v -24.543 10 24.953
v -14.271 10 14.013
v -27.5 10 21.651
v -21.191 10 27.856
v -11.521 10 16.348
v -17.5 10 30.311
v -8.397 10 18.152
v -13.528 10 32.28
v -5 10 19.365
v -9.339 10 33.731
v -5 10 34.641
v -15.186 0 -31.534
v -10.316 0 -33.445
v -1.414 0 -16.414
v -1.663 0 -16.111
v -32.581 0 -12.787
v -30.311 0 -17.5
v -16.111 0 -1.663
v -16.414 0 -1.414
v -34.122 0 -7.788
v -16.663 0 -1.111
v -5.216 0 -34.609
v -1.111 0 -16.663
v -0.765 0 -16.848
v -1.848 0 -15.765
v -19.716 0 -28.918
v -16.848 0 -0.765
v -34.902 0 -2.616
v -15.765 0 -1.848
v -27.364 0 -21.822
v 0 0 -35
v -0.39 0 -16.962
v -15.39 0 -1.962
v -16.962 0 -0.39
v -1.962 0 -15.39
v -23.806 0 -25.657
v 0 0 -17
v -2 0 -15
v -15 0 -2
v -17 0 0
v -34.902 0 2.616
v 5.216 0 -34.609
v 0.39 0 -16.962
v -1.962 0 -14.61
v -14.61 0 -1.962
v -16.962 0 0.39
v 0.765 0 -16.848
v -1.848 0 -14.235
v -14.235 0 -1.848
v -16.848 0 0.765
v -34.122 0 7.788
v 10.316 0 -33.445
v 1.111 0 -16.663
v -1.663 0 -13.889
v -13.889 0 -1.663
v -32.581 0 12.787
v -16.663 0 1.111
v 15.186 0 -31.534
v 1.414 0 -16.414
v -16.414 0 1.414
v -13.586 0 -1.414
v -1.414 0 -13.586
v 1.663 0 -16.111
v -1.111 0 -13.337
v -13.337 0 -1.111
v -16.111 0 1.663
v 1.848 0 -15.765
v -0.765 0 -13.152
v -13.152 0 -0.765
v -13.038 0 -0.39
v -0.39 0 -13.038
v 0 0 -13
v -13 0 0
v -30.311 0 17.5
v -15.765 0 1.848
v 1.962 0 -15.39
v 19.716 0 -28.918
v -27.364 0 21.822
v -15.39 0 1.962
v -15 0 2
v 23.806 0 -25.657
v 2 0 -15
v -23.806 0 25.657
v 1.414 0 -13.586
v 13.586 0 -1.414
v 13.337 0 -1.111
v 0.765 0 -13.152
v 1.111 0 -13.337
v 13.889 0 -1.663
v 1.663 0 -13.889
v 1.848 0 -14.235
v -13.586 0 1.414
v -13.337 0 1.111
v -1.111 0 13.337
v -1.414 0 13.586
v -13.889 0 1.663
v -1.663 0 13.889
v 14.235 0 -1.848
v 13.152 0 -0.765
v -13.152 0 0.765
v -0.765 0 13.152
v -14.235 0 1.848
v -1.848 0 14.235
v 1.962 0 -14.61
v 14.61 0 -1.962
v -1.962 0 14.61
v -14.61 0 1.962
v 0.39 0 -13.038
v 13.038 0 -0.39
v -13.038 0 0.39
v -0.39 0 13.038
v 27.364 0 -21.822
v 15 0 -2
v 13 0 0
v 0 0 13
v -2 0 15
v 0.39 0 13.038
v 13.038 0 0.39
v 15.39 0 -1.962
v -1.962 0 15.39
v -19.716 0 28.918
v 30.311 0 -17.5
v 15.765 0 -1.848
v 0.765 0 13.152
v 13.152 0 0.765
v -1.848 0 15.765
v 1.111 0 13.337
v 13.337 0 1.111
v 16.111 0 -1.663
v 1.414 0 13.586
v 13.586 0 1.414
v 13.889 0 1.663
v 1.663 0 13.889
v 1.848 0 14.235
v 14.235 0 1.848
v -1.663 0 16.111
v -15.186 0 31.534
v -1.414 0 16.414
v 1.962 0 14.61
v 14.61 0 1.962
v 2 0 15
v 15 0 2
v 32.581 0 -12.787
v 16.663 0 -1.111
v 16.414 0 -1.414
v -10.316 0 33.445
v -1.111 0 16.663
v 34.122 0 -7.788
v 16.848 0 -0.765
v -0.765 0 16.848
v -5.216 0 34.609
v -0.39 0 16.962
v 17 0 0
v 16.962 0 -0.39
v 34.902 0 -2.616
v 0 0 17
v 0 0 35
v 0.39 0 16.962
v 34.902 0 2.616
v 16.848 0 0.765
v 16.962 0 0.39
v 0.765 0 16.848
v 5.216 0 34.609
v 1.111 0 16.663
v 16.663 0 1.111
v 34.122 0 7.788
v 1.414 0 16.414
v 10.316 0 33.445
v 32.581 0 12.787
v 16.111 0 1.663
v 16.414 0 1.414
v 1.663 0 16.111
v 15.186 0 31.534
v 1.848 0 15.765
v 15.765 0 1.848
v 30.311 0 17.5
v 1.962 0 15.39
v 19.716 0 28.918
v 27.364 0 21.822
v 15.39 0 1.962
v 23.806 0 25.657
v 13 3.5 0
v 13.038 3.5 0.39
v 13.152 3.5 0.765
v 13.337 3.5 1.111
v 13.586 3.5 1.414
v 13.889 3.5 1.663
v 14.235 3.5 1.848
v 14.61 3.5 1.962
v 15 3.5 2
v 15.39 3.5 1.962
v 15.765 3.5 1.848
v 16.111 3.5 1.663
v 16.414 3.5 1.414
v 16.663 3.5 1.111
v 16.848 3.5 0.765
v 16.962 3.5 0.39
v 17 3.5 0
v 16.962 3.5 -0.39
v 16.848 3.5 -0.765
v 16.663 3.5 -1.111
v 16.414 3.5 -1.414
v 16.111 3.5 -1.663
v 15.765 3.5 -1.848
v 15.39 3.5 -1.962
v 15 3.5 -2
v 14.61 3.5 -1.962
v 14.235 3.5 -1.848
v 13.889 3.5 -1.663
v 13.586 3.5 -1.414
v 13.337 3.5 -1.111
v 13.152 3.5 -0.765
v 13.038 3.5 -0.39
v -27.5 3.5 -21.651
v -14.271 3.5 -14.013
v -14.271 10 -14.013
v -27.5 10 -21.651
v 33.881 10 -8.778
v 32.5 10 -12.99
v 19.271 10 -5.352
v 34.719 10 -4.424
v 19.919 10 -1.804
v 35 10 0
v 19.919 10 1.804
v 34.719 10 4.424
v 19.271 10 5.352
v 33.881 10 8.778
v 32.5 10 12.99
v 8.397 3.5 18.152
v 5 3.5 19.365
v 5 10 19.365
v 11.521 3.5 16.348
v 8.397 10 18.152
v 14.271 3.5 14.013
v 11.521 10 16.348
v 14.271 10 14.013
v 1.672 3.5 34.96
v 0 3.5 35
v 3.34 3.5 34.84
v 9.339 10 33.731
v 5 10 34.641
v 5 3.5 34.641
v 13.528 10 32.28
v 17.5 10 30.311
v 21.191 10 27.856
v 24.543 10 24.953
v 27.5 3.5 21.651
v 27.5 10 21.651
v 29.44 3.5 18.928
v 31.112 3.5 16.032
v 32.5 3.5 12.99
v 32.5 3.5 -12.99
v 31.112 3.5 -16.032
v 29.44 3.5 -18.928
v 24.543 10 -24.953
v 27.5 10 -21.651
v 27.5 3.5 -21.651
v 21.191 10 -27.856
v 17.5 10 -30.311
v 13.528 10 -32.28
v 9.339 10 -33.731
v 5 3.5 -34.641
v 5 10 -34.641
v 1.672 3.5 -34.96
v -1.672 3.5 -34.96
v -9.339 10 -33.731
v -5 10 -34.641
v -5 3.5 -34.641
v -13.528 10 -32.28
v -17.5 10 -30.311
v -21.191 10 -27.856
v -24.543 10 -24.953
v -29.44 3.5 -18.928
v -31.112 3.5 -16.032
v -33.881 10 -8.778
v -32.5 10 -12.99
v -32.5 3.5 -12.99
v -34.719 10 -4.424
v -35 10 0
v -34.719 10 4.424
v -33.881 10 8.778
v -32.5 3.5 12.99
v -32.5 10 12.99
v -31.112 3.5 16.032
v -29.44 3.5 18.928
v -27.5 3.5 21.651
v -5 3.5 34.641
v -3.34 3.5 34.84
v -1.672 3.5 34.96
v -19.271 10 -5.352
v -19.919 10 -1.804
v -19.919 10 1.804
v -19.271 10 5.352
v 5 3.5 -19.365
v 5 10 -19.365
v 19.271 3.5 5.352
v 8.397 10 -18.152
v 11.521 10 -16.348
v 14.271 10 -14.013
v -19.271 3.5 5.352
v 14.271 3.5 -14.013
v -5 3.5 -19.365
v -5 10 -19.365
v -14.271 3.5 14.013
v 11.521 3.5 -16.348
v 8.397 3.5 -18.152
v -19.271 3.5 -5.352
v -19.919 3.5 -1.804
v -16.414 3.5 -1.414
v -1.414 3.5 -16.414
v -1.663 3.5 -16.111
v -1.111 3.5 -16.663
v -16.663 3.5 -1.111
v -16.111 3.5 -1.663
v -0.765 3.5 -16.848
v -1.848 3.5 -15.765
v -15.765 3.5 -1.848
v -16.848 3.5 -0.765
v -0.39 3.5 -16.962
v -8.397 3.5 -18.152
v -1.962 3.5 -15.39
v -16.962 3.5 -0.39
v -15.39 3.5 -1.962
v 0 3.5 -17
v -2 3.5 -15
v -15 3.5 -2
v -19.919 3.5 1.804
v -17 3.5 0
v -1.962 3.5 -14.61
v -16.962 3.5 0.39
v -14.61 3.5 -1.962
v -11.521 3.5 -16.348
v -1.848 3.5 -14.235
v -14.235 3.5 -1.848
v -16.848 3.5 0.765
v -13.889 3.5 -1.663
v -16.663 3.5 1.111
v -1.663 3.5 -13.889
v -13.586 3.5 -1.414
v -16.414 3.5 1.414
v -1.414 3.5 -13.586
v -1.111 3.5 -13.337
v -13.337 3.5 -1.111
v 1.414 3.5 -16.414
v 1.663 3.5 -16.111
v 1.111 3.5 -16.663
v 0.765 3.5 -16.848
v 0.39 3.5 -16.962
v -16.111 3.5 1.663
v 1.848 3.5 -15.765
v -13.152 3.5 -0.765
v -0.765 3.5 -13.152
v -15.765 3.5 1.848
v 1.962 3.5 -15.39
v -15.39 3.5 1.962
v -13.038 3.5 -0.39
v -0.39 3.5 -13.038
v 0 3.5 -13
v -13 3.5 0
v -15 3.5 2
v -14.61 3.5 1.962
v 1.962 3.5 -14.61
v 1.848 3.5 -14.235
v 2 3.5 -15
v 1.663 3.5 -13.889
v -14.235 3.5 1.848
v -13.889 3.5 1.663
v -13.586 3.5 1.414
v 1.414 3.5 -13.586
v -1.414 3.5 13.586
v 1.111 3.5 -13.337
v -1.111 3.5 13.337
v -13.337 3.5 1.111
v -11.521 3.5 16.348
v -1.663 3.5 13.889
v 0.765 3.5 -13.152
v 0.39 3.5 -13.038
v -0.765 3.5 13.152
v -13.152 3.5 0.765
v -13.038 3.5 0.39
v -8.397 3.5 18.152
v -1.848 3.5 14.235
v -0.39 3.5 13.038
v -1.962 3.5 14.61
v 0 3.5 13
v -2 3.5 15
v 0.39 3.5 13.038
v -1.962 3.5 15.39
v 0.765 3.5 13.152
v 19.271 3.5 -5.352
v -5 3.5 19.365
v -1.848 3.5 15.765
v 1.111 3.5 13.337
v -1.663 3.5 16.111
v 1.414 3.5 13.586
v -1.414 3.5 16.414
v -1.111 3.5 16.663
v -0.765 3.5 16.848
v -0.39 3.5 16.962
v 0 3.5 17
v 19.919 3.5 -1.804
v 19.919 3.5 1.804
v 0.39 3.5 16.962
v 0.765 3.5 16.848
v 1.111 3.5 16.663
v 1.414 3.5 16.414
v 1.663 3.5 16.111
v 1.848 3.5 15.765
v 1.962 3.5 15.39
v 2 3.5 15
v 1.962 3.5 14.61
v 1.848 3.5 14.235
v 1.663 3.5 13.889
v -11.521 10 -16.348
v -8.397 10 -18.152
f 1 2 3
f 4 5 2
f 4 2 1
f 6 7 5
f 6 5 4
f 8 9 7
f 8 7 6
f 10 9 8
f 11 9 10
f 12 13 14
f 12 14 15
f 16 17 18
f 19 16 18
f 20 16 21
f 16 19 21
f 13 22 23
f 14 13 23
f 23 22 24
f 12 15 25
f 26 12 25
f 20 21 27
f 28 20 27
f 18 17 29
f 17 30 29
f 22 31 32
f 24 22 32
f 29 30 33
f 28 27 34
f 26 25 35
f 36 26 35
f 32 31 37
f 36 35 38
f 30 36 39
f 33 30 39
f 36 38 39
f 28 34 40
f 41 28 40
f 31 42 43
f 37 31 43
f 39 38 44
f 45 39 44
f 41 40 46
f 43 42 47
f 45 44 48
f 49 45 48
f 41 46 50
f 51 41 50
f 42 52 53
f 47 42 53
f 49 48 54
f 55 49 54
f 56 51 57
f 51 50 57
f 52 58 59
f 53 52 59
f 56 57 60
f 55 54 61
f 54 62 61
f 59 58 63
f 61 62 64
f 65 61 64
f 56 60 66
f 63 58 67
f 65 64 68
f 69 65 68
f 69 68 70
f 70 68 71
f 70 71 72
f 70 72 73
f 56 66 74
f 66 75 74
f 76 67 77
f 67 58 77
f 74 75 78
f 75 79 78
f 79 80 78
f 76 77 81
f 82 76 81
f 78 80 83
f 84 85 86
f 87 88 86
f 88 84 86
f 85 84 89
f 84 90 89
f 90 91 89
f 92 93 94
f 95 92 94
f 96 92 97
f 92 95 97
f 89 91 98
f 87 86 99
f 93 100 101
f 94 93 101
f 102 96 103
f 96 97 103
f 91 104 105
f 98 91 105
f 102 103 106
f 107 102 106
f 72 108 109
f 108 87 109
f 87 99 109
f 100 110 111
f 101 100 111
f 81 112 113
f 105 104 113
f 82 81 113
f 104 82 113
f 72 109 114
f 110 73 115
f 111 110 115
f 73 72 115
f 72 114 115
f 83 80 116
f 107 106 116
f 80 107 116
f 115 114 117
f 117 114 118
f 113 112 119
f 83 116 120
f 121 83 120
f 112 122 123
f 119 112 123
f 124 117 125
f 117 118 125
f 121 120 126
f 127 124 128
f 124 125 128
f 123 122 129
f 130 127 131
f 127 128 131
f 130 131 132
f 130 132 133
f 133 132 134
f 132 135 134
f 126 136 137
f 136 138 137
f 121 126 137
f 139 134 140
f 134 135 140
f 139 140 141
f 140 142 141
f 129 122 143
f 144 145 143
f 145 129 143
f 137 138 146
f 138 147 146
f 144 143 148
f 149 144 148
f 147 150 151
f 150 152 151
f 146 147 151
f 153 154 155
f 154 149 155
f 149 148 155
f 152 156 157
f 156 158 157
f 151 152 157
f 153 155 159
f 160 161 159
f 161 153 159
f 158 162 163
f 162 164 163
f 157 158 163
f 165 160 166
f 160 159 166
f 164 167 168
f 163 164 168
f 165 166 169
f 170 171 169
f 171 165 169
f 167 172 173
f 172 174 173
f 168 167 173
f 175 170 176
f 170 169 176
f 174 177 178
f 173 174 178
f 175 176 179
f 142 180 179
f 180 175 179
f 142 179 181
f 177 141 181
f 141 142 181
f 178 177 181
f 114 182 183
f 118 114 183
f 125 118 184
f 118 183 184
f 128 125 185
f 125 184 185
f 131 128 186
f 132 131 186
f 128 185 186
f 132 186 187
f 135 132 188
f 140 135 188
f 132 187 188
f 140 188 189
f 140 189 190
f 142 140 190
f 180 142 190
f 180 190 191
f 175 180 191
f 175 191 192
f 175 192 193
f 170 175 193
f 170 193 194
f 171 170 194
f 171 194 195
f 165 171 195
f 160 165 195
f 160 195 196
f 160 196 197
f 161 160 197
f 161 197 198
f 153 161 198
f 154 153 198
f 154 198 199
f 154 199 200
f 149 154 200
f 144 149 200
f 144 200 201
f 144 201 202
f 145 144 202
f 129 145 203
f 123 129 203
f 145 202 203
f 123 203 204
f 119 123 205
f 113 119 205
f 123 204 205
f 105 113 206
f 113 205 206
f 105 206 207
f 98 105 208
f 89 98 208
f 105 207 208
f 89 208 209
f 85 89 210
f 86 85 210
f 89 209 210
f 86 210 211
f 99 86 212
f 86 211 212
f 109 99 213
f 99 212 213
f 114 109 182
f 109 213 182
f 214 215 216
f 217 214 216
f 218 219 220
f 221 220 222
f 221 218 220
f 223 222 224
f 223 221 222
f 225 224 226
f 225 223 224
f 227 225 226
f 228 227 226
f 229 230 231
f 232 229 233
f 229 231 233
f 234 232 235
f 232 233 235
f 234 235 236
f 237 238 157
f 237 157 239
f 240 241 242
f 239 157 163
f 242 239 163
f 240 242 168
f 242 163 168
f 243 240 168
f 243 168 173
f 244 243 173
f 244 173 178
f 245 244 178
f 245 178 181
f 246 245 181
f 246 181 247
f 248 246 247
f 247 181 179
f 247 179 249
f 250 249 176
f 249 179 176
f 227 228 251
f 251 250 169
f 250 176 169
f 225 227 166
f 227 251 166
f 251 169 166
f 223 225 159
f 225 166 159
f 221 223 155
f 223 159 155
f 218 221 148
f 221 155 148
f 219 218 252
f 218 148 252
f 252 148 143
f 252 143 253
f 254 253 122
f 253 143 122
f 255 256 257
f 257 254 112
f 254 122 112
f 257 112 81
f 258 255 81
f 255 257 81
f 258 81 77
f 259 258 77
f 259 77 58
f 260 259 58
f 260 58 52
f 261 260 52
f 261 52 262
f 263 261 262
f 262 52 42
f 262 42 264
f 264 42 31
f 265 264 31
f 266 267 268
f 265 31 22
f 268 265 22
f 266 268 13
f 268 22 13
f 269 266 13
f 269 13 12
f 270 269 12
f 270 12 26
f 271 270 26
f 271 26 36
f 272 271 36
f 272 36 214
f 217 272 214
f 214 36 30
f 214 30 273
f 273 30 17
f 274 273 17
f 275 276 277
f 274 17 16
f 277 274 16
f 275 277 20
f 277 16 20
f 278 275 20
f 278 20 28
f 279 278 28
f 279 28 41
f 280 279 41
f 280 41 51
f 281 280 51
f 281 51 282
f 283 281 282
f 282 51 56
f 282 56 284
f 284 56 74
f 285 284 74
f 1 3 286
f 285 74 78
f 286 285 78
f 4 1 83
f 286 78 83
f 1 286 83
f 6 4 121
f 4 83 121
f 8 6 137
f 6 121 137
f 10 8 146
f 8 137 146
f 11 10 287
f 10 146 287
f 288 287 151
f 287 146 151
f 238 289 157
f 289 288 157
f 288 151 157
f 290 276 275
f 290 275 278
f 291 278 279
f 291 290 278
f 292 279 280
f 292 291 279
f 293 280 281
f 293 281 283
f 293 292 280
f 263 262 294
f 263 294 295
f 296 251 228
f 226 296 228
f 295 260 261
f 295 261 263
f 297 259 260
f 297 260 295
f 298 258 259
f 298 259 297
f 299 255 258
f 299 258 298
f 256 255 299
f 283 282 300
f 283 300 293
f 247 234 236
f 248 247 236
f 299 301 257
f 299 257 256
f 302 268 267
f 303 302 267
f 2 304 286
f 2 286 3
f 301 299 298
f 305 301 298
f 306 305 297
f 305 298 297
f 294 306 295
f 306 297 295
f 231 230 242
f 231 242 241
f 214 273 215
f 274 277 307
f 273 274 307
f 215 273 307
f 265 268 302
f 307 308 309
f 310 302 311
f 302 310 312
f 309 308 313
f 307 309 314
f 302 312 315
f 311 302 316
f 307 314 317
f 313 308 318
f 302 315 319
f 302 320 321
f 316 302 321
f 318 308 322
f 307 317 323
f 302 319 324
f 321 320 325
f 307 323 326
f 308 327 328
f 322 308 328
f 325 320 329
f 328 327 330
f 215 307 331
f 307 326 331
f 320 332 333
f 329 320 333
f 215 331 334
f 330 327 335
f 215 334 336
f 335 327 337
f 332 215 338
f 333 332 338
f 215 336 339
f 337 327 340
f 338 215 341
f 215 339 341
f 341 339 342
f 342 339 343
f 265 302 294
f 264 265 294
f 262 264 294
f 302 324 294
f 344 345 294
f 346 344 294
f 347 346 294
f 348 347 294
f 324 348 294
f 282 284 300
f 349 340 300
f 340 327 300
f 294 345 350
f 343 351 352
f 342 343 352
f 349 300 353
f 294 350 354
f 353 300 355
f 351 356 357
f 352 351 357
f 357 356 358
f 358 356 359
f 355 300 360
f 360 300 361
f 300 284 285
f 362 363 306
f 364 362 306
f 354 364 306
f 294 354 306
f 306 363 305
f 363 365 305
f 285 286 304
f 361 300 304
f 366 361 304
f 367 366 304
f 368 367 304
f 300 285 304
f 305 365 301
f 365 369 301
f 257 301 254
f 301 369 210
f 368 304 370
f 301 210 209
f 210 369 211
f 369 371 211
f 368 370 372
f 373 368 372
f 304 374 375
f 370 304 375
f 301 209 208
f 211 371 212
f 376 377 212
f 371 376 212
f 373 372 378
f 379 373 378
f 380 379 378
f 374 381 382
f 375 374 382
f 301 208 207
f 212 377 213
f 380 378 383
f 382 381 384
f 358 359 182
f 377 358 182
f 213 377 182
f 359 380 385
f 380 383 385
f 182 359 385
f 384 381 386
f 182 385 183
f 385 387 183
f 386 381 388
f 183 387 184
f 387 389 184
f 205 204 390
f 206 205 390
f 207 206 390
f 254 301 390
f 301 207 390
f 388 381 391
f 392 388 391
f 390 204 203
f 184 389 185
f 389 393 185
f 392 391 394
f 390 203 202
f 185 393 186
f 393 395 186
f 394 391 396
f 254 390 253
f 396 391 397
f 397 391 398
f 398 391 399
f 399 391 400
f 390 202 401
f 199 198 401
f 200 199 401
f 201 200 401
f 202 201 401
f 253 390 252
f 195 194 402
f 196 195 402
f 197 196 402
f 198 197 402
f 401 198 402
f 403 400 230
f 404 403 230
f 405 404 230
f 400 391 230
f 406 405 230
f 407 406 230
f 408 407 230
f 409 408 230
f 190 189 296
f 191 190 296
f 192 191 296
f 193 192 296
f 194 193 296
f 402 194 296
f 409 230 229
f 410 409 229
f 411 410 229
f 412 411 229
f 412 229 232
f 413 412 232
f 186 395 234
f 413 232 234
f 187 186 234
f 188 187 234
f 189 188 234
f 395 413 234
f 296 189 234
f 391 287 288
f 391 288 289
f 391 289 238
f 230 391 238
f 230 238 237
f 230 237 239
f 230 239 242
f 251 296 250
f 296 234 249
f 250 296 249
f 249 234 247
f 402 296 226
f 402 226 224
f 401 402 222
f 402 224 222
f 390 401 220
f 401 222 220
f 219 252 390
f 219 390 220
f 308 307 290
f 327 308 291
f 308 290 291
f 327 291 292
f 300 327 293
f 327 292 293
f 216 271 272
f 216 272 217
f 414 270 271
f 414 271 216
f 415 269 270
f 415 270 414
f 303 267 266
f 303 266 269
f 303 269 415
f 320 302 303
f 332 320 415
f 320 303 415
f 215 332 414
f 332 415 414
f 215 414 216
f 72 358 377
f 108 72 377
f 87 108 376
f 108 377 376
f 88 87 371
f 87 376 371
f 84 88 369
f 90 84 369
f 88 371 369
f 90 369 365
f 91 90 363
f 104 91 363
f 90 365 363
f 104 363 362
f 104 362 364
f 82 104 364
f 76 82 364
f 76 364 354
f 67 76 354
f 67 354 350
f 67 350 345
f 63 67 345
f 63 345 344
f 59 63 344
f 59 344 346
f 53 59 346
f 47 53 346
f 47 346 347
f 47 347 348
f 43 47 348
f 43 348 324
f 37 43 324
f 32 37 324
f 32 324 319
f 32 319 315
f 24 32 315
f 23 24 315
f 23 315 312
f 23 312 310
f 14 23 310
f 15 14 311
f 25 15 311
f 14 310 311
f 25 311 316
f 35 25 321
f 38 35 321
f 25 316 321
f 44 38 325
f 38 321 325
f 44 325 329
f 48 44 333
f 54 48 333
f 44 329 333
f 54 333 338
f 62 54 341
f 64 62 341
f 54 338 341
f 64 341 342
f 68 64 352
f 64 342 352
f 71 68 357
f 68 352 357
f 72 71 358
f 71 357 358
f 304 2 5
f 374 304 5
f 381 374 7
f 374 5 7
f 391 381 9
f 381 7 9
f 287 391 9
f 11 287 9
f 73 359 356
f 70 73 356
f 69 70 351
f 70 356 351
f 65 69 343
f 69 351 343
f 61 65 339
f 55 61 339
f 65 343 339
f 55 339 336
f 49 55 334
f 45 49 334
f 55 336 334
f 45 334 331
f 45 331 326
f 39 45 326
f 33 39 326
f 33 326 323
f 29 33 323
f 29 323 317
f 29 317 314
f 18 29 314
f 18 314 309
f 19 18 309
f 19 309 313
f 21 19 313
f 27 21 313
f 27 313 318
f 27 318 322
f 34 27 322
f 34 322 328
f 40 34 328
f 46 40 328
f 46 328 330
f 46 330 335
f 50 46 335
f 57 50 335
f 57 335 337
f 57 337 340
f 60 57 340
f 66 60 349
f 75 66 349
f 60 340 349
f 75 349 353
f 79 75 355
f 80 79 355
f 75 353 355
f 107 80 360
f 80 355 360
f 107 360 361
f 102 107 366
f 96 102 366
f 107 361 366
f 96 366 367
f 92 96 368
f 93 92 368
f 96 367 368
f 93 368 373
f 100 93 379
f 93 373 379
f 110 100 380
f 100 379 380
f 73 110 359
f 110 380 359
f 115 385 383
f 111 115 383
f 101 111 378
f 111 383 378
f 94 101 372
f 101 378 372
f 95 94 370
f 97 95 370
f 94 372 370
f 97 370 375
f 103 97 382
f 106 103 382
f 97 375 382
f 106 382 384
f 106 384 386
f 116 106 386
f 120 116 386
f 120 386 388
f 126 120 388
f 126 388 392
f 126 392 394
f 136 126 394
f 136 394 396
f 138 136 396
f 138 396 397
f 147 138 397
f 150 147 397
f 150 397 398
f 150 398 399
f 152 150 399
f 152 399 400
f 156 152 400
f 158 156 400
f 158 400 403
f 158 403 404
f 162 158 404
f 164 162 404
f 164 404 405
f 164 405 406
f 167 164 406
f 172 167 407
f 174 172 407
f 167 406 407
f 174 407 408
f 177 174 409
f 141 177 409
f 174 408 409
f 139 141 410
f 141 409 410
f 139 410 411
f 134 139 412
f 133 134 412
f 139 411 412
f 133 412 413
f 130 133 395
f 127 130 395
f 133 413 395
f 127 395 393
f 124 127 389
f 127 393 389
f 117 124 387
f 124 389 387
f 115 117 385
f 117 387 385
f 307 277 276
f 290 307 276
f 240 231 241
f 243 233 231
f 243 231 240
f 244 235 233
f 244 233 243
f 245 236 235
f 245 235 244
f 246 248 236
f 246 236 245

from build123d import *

# Parameters (mm, degrees)
SKETCH1_R           = 35
BOSS_EXTRUDE1_DEPTH = 10
CUT_EXTRUDE1_REACH  = 52.498
SKETCH2_R           = 2
CIRPATTERN1_COUNT   = 4
SKETCH5_W           = 10
SKETCH5_H           = 16.60119737
CUT_EXTRUDE2_DEPTH  = 51.497524692
CIRPATTERN2_COUNT   = 3
SKETCH6_R           = 20
CUT_EXTRUDE3_DEPTH  = 6.5


with BuildPart() as part:
    # Sketch1 → Boss-Extrude1 (new body)
    with BuildSketch(Plane(origin=(0, 0, 0), x_dir=(1, 0, 0), z_dir=(0, 1, 0))):
        with Locations(Location((0, 0, 0), (0, 0, 270))):
            Circle(SKETCH1_R)
    extrude(amount=BOSS_EXTRUDE1_DEPTH)

    # Sketch2 → Cut-Extrude1 (cut, up to next)
    with BuildSketch(Plane(origin=(0, 10, 0), x_dir=(1, 0, 0), z_dir=(0, 1, 0)), mode=Mode.PRIVATE) as cut_extrude1_sk1:
        with Locations(Location((0, 15, 0), (0, 0, 270))):
            Circle(SKETCH2_R)
    cut_extrude1_tool1 = extrude(cut_extrude1_sk1.sketch, amount=-CUT_EXTRUDE1_REACH, mode=Mode.PRIVATE) & part.part
    cut_extrude1 = cut_extrude1_tool1.solids().sort_by_distance((0, 10, -15))[0]
    add(cut_extrude1, mode=Mode.SUBTRACT)

    # CirPattern1: Cut-Extrude1 ×4 about axis
    cirpattern1_axis = Axis((0, 0, 0), (0, 1, 0))
    for i in range(1, CIRPATTERN1_COUNT):
        add(cut_extrude1.rotate(cirpattern1_axis, i * 360 / CIRPATTERN1_COUNT), mode=Mode.SUBTRACT)

    # Sketch5 → Cut-Extrude2 (cut, symmetric)
    with BuildSketch(Plane.XY):
        with Locations((0, 11.800598685)):
            Rectangle(SKETCH5_W, SKETCH5_H)
    cut_extrude2 = extrude(amount=CUT_EXTRUDE2_DEPTH, both=True, mode=Mode.SUBTRACT)

    # CirPattern2: Cut-Extrude2 ×3 about axis
    cirpattern2_axis = Axis((0, 0, 0), (0, 1, 0))
    for i in range(1, CIRPATTERN2_COUNT):
        add(cut_extrude2.rotate(cirpattern2_axis, i * 360 / CIRPATTERN2_COUNT), mode=Mode.SUBTRACT)

    # Sketch6 → Cut-Extrude3 (cut)
    with BuildSketch(Plane(origin=(0, 10, 0), x_dir=(1, 0, 0), z_dir=(0, 1, 0))):
        Circle(SKETCH6_R)
    extrude(amount=-CUT_EXTRUDE3_DEPTH, mode=Mode.SUBTRACT)


solid = part.part
